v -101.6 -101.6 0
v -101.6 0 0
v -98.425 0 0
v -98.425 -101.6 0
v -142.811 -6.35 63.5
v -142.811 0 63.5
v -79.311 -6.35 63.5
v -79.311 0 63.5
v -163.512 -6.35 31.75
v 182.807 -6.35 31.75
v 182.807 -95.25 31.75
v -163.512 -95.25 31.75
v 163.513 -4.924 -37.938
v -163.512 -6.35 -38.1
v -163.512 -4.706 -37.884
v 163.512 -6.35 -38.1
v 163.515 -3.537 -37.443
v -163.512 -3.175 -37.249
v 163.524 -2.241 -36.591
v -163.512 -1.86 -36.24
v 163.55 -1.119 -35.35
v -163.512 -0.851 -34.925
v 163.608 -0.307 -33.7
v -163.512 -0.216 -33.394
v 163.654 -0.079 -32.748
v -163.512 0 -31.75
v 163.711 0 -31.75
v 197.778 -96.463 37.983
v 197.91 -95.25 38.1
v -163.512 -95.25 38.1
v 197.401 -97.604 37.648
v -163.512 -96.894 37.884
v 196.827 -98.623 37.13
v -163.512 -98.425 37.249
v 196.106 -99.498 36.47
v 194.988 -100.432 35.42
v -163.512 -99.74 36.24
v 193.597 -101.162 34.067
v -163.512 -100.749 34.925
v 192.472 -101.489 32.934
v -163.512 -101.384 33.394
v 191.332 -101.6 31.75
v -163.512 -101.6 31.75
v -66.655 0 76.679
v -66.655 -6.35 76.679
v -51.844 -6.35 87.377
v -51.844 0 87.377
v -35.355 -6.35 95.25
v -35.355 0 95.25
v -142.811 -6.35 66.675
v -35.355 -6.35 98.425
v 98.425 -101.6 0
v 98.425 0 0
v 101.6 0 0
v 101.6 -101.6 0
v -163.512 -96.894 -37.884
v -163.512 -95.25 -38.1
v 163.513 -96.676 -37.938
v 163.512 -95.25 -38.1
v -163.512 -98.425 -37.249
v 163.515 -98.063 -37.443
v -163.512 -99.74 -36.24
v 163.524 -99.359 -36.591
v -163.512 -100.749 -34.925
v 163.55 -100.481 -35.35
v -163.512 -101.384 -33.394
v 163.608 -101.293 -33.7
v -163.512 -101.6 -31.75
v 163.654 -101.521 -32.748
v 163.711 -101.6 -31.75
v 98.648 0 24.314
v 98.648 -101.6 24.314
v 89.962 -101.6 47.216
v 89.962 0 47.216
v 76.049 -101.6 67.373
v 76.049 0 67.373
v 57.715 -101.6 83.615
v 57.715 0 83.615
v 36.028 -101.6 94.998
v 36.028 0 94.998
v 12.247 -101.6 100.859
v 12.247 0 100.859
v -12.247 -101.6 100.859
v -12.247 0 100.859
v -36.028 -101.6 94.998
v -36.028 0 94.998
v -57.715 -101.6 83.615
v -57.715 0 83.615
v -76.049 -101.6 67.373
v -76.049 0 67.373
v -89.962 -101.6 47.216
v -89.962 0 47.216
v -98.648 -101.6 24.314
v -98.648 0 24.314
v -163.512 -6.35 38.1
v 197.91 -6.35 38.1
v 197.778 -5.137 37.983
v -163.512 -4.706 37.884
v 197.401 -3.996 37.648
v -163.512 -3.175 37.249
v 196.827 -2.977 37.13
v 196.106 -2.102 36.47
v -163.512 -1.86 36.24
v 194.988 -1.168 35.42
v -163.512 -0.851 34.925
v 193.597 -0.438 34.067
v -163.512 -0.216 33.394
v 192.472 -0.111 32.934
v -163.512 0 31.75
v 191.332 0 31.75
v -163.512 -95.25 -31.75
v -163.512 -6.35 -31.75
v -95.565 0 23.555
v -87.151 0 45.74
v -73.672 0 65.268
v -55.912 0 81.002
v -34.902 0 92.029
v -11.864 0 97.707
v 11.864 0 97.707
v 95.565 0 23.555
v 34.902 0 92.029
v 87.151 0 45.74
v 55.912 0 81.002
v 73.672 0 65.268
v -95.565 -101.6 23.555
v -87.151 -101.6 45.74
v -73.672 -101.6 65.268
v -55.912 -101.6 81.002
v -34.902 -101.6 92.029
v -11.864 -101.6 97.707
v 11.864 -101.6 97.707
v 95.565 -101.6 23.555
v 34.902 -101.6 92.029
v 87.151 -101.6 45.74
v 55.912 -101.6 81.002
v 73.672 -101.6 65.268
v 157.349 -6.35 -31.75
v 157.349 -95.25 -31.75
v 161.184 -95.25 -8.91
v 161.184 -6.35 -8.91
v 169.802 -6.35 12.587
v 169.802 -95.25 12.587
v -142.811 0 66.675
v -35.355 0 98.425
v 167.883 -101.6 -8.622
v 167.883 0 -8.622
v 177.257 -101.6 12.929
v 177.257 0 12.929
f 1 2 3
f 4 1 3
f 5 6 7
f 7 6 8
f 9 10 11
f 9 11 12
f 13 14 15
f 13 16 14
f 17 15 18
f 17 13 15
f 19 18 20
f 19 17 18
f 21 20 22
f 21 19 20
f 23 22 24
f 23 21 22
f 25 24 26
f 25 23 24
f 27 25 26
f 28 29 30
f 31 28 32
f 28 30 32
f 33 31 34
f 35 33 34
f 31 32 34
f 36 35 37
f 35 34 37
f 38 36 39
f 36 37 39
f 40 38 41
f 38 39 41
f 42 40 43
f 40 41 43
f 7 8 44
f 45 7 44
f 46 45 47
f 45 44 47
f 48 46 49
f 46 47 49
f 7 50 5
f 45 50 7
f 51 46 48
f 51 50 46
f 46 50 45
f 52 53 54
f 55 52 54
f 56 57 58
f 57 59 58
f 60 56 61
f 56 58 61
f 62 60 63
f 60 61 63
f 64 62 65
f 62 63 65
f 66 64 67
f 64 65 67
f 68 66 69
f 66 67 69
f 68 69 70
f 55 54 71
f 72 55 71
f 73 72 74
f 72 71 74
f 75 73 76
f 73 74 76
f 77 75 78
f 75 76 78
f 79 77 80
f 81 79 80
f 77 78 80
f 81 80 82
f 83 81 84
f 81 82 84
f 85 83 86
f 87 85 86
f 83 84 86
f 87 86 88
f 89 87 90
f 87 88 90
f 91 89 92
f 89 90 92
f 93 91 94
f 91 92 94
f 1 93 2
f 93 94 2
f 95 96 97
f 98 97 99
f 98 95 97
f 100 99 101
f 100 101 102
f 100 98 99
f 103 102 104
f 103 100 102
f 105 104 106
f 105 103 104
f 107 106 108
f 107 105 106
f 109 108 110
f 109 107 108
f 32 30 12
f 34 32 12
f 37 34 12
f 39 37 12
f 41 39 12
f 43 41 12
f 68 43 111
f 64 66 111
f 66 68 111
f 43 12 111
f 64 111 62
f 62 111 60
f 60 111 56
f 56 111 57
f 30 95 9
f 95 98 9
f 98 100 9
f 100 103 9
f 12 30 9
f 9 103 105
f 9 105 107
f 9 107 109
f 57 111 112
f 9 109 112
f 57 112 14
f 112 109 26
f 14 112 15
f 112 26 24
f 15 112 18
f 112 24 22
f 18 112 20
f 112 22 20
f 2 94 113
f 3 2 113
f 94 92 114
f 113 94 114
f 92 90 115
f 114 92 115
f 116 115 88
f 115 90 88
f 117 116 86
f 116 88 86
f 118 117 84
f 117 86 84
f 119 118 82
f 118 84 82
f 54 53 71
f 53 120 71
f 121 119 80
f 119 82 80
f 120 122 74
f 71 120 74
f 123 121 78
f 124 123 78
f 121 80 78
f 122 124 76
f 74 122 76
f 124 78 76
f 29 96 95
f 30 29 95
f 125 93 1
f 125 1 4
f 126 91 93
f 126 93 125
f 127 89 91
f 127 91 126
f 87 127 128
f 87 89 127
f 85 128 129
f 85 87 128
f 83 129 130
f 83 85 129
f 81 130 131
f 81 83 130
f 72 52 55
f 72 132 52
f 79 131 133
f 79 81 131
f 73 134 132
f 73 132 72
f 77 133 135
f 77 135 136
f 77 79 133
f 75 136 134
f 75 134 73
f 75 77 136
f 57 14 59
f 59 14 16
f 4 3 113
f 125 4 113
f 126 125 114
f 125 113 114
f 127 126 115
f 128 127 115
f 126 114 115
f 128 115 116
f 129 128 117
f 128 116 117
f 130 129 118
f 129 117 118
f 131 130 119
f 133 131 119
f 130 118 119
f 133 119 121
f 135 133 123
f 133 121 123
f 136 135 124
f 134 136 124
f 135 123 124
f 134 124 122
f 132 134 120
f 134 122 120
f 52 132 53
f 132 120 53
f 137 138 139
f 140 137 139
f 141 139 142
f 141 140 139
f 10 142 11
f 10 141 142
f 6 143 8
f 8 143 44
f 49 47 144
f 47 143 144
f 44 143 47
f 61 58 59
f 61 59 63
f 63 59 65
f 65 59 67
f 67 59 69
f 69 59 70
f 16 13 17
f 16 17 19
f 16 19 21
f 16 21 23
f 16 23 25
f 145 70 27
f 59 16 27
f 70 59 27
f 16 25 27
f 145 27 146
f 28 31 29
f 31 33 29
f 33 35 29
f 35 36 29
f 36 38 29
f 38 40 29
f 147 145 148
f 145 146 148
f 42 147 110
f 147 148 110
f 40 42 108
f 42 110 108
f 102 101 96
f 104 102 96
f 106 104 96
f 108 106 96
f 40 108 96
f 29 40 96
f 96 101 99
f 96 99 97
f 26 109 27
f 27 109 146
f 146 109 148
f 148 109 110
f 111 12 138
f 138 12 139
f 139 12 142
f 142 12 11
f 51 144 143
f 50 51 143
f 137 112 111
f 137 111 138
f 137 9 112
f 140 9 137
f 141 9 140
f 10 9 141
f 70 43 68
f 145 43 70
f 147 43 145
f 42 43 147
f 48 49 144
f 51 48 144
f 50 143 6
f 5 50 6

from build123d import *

# Parameters (mm, degrees)
F1_DEPTH = 101.6
F2_R     = 6.35
F3_T     = 6.35
F5_DEPTH = 101.6
F7_DEPTH = 6.35


# Not quite as in the source:
# - a shell that OpenCascade refuses in one call is made with other operations: the cavity is built on its own and cut out


with BuildPart() as f1:
    # F0 (on Front) → F1 (new body)
    with BuildSketch(Plane.XZ):
        with BuildLine():
            Line((197.910416699, 38.1), (163.5125, 38.1))
            Line((163.5125, 38.1), (-163.5125, 38.1))
            Line((-163.5125, 38.1), (-163.5125, -38.1))
            Line((-163.5125, -38.1), (163.5125, -38.1))
            ThreePointArc((163.5125, -38.1), (172.510416699, 3.702083301), (197.910416699, 38.1))
        make_face()
    extrude(amount=F1_DEPTH)

    # F2
    f2_edges = [f1.edges().sort_by_distance(p)[0] for p in [
        (17.198958, -101.6, 38.1),
        (0, -101.6, -38.1),
        (17.198958, 0, 38.1),
        (0, 0, -38.1),
    ]]
    fillet(f2_edges, radius=F2_R)

    # F3: shell of thickness 6.35, made by hand


with BuildPart() as f3_core1:
    # F3_t2: copy of F1
    add(f1.part)

    # the walls: a layer under each face that stays
    f3_faces = [f3_core1.faces().sort_by_distance(p)[0] for p in [
        (172.510416699, -50.8, 3.702083301),
        (0, -50.8, -38.1),
        (13.9098336274, 0, 0),
        (13.9098336274, -101.6, 0),
        (17.1989583495, -50.8, 38.1),
    ]]
    thicken(f3_faces, amount=-F3_T, mode=Mode.SUBTRACT)


with BuildPart() as f1_1:
    add(f1.part)

    # what is left inside the walls is the cavity
    f3_cavity = [f3_core1.part.solids().sort_by_distance(p)[0] for p in [
        (9.647297, -65.616667, 31.6865),
    ]]
    add(f3_cavity, mode=Mode.SUBTRACT)


with BuildPart() as f5:
    # F4 (on Front) → F5 (new body)
    with BuildSketch(Plane.XZ):
        with BuildLine():
            Line((98.425, 0), (101.6, 0))
            ThreePointArc((101.6, 0), (0, 101.6), (-101.6, 0))
            Line((-101.6, 0), (-98.425, 0))
            ThreePointArc((-98.425, 0), (0, 98.425), (98.425, 0))
        make_face()
    extrude(amount=F5_DEPTH)


with BuildPart() as f7:
    # F6 (on Front) → F7 (new body)
    with BuildSketch(Plane.XZ):
        with BuildLine():
            ThreePointArc((-79.3114745797, 63.5), (-59.4906138436, 82.3615618144), (-35.355303704, 95.25))
            Line((-35.355303704, 95.25), (-35.355303704, 98.425))
            Line((-35.355303704, 98.425), (-142.8114745797, 66.675))
            Line((-142.8114745797, 66.675), (-142.8114745797, 63.5))
            Line((-142.8114745797, 63.5), (-79.3114745797, 63.5))
        make_face()
    extrude(amount=F7_DEPTH)


solid = Compound([f1_1.part, f5.part, f7.part])
